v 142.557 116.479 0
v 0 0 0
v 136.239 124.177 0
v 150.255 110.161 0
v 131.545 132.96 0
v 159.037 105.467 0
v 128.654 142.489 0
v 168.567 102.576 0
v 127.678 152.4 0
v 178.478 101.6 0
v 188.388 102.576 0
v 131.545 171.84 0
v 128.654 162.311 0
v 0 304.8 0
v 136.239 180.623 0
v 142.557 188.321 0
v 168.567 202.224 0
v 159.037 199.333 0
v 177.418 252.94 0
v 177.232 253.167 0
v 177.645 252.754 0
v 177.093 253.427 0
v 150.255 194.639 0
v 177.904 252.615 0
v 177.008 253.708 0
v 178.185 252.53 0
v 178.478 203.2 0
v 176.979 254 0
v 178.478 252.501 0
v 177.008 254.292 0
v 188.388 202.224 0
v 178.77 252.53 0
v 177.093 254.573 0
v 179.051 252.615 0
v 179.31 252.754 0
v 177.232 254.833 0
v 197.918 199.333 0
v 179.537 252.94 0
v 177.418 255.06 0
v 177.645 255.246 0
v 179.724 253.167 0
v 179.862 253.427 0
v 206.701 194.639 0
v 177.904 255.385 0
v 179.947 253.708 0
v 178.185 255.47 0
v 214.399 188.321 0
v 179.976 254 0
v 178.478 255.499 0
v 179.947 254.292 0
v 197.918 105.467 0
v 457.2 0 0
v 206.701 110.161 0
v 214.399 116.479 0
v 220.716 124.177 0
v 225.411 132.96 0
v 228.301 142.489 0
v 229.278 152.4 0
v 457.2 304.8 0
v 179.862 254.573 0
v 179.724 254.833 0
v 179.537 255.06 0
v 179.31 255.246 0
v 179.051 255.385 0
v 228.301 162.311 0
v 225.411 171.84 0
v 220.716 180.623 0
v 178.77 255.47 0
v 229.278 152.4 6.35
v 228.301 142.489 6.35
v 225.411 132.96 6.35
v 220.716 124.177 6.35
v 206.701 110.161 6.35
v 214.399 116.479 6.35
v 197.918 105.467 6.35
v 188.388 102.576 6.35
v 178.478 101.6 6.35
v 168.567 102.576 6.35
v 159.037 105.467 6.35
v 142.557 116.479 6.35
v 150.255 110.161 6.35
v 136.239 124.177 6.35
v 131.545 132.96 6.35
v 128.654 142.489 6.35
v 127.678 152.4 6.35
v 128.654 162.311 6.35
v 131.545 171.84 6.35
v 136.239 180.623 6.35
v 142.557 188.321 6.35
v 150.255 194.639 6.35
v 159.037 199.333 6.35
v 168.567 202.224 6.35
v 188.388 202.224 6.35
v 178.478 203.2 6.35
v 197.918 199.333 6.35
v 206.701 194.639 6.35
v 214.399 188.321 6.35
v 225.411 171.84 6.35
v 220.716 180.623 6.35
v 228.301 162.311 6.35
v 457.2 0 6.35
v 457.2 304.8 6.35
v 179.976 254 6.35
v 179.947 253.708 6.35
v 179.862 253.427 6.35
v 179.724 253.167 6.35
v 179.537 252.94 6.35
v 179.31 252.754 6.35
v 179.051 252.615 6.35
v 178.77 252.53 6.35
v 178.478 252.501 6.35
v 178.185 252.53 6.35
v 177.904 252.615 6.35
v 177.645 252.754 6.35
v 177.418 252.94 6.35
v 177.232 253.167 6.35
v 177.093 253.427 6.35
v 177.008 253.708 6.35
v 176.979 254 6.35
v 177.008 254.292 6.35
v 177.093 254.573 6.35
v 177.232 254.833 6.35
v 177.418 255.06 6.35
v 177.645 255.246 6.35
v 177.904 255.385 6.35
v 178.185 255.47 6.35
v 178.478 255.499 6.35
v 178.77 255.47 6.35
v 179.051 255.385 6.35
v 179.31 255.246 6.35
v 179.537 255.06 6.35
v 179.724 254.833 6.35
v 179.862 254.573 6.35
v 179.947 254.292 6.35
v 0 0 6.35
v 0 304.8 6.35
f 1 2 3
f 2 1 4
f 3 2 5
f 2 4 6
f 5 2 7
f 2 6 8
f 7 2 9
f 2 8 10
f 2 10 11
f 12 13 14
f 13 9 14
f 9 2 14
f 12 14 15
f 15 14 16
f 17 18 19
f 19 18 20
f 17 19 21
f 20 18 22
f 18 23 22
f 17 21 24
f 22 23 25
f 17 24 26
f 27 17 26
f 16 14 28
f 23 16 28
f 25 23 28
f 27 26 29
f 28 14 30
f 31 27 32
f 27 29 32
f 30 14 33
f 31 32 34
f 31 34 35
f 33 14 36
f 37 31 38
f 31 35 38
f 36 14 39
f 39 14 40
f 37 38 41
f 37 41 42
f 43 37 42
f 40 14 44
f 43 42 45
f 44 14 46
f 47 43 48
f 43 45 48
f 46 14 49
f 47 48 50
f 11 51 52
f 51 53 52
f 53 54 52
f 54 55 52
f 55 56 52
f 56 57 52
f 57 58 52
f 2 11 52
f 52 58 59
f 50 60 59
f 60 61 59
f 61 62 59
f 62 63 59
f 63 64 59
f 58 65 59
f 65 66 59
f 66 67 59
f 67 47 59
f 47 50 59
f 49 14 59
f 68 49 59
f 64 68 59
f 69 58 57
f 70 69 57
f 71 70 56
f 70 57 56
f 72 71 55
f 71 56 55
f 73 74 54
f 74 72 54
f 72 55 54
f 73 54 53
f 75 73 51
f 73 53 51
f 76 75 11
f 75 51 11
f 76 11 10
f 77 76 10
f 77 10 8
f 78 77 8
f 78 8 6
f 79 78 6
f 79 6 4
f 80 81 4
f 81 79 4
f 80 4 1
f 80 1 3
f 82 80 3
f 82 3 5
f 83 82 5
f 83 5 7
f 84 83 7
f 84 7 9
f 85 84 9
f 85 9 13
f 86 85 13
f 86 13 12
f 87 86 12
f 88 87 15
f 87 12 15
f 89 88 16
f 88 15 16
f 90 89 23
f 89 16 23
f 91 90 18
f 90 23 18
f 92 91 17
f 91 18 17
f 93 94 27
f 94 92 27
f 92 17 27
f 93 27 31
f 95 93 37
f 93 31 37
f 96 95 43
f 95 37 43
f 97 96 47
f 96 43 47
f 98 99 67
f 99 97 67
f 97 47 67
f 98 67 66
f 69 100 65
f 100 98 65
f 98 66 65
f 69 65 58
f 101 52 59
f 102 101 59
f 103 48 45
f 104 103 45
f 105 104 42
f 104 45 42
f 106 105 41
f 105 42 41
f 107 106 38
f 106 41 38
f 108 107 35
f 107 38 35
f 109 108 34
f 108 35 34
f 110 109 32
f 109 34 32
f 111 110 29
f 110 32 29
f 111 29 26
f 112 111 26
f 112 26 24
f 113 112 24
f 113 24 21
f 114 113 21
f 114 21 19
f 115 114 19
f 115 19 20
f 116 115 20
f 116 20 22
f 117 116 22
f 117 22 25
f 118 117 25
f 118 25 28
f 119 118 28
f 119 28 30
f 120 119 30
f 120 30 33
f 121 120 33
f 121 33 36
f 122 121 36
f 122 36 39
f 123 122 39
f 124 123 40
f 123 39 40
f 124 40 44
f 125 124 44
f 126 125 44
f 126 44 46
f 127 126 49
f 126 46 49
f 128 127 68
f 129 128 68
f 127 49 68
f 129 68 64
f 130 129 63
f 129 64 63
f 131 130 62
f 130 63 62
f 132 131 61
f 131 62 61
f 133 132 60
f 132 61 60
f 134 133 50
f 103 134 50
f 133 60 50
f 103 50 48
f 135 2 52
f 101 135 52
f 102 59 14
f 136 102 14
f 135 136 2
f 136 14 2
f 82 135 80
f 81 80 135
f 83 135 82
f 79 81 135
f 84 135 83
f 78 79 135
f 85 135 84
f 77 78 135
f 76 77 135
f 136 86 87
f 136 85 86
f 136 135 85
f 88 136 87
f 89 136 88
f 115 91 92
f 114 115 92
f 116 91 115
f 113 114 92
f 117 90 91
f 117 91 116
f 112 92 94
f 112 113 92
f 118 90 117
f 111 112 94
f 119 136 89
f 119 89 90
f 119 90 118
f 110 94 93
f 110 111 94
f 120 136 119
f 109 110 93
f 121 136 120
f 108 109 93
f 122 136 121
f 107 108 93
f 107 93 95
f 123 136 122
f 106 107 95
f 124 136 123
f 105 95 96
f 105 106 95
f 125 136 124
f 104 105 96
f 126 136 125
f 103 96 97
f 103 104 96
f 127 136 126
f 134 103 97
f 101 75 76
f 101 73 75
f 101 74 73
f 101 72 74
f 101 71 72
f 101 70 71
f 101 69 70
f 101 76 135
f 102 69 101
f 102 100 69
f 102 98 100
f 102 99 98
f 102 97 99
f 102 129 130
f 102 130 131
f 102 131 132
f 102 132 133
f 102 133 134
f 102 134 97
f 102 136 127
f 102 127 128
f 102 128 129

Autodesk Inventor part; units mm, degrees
ref_plane "YZ Plane" through (0, 0, 0) normal (1, 0, 0) x (0, 1, 0)
ref_plane "XZ Plane" through (0, 0, 0) normal (0, 1, 0) x (-1, 0, 0)
ref_plane "XY Plane" through (0, 0, 0) normal (0, 0, 1) x (1, 0, 0)
sketch "Sketch1" plane through (0, 0, 0) normal (0, 0, 1) x (1, 0, 0)
  line L0 (0, 0) -> (457.2, 0)
  line L1 (457.2, 0) -> (457.2, 304.8)
  line L2 (457.2, 304.8) -> (0, 304.8)
  line L3 (0, 304.8) -> (0, 0)
  arc A0 (0.6776, 254) -> (325.1105, 153.4434) centre (178.4776, 254) ccw
  circle A1 centre (178.4776, 152.4) radius 50.8
  line L4 (394.0694, 254) -> (325.1105, 153.4434)
  circle A2 centre (178.4776, 254) radius 1.4986
  line L5 (0, 254) -> (176.979, 254)
  line L6 (179.9762, 254) -> (457.2, 254)
  dimension "d0" = 457.2
  dimension "d1" = 304.8
  dimension "d4" = 101.6
sketch "Sketch2" plane through (0, 0, 0) normal (0, 0, 1) x (1, 0, 0)
  point P0 (0, 0)
extrude "Extrusion2" add sketch "Sketch1" along normal blind 6.35 contours L3 L5 A0 L4 L6 L1 L0 | L3 L2 L1 L6 A2 L5 | L5 A2 L6 L4 A0
sketch "Sketch3" plane through (0, 0, 6.35) normal (0, 0, 1) x (1, 0, 0)
  point P0 (0, 0)
properties part number "ShooterWall2"
